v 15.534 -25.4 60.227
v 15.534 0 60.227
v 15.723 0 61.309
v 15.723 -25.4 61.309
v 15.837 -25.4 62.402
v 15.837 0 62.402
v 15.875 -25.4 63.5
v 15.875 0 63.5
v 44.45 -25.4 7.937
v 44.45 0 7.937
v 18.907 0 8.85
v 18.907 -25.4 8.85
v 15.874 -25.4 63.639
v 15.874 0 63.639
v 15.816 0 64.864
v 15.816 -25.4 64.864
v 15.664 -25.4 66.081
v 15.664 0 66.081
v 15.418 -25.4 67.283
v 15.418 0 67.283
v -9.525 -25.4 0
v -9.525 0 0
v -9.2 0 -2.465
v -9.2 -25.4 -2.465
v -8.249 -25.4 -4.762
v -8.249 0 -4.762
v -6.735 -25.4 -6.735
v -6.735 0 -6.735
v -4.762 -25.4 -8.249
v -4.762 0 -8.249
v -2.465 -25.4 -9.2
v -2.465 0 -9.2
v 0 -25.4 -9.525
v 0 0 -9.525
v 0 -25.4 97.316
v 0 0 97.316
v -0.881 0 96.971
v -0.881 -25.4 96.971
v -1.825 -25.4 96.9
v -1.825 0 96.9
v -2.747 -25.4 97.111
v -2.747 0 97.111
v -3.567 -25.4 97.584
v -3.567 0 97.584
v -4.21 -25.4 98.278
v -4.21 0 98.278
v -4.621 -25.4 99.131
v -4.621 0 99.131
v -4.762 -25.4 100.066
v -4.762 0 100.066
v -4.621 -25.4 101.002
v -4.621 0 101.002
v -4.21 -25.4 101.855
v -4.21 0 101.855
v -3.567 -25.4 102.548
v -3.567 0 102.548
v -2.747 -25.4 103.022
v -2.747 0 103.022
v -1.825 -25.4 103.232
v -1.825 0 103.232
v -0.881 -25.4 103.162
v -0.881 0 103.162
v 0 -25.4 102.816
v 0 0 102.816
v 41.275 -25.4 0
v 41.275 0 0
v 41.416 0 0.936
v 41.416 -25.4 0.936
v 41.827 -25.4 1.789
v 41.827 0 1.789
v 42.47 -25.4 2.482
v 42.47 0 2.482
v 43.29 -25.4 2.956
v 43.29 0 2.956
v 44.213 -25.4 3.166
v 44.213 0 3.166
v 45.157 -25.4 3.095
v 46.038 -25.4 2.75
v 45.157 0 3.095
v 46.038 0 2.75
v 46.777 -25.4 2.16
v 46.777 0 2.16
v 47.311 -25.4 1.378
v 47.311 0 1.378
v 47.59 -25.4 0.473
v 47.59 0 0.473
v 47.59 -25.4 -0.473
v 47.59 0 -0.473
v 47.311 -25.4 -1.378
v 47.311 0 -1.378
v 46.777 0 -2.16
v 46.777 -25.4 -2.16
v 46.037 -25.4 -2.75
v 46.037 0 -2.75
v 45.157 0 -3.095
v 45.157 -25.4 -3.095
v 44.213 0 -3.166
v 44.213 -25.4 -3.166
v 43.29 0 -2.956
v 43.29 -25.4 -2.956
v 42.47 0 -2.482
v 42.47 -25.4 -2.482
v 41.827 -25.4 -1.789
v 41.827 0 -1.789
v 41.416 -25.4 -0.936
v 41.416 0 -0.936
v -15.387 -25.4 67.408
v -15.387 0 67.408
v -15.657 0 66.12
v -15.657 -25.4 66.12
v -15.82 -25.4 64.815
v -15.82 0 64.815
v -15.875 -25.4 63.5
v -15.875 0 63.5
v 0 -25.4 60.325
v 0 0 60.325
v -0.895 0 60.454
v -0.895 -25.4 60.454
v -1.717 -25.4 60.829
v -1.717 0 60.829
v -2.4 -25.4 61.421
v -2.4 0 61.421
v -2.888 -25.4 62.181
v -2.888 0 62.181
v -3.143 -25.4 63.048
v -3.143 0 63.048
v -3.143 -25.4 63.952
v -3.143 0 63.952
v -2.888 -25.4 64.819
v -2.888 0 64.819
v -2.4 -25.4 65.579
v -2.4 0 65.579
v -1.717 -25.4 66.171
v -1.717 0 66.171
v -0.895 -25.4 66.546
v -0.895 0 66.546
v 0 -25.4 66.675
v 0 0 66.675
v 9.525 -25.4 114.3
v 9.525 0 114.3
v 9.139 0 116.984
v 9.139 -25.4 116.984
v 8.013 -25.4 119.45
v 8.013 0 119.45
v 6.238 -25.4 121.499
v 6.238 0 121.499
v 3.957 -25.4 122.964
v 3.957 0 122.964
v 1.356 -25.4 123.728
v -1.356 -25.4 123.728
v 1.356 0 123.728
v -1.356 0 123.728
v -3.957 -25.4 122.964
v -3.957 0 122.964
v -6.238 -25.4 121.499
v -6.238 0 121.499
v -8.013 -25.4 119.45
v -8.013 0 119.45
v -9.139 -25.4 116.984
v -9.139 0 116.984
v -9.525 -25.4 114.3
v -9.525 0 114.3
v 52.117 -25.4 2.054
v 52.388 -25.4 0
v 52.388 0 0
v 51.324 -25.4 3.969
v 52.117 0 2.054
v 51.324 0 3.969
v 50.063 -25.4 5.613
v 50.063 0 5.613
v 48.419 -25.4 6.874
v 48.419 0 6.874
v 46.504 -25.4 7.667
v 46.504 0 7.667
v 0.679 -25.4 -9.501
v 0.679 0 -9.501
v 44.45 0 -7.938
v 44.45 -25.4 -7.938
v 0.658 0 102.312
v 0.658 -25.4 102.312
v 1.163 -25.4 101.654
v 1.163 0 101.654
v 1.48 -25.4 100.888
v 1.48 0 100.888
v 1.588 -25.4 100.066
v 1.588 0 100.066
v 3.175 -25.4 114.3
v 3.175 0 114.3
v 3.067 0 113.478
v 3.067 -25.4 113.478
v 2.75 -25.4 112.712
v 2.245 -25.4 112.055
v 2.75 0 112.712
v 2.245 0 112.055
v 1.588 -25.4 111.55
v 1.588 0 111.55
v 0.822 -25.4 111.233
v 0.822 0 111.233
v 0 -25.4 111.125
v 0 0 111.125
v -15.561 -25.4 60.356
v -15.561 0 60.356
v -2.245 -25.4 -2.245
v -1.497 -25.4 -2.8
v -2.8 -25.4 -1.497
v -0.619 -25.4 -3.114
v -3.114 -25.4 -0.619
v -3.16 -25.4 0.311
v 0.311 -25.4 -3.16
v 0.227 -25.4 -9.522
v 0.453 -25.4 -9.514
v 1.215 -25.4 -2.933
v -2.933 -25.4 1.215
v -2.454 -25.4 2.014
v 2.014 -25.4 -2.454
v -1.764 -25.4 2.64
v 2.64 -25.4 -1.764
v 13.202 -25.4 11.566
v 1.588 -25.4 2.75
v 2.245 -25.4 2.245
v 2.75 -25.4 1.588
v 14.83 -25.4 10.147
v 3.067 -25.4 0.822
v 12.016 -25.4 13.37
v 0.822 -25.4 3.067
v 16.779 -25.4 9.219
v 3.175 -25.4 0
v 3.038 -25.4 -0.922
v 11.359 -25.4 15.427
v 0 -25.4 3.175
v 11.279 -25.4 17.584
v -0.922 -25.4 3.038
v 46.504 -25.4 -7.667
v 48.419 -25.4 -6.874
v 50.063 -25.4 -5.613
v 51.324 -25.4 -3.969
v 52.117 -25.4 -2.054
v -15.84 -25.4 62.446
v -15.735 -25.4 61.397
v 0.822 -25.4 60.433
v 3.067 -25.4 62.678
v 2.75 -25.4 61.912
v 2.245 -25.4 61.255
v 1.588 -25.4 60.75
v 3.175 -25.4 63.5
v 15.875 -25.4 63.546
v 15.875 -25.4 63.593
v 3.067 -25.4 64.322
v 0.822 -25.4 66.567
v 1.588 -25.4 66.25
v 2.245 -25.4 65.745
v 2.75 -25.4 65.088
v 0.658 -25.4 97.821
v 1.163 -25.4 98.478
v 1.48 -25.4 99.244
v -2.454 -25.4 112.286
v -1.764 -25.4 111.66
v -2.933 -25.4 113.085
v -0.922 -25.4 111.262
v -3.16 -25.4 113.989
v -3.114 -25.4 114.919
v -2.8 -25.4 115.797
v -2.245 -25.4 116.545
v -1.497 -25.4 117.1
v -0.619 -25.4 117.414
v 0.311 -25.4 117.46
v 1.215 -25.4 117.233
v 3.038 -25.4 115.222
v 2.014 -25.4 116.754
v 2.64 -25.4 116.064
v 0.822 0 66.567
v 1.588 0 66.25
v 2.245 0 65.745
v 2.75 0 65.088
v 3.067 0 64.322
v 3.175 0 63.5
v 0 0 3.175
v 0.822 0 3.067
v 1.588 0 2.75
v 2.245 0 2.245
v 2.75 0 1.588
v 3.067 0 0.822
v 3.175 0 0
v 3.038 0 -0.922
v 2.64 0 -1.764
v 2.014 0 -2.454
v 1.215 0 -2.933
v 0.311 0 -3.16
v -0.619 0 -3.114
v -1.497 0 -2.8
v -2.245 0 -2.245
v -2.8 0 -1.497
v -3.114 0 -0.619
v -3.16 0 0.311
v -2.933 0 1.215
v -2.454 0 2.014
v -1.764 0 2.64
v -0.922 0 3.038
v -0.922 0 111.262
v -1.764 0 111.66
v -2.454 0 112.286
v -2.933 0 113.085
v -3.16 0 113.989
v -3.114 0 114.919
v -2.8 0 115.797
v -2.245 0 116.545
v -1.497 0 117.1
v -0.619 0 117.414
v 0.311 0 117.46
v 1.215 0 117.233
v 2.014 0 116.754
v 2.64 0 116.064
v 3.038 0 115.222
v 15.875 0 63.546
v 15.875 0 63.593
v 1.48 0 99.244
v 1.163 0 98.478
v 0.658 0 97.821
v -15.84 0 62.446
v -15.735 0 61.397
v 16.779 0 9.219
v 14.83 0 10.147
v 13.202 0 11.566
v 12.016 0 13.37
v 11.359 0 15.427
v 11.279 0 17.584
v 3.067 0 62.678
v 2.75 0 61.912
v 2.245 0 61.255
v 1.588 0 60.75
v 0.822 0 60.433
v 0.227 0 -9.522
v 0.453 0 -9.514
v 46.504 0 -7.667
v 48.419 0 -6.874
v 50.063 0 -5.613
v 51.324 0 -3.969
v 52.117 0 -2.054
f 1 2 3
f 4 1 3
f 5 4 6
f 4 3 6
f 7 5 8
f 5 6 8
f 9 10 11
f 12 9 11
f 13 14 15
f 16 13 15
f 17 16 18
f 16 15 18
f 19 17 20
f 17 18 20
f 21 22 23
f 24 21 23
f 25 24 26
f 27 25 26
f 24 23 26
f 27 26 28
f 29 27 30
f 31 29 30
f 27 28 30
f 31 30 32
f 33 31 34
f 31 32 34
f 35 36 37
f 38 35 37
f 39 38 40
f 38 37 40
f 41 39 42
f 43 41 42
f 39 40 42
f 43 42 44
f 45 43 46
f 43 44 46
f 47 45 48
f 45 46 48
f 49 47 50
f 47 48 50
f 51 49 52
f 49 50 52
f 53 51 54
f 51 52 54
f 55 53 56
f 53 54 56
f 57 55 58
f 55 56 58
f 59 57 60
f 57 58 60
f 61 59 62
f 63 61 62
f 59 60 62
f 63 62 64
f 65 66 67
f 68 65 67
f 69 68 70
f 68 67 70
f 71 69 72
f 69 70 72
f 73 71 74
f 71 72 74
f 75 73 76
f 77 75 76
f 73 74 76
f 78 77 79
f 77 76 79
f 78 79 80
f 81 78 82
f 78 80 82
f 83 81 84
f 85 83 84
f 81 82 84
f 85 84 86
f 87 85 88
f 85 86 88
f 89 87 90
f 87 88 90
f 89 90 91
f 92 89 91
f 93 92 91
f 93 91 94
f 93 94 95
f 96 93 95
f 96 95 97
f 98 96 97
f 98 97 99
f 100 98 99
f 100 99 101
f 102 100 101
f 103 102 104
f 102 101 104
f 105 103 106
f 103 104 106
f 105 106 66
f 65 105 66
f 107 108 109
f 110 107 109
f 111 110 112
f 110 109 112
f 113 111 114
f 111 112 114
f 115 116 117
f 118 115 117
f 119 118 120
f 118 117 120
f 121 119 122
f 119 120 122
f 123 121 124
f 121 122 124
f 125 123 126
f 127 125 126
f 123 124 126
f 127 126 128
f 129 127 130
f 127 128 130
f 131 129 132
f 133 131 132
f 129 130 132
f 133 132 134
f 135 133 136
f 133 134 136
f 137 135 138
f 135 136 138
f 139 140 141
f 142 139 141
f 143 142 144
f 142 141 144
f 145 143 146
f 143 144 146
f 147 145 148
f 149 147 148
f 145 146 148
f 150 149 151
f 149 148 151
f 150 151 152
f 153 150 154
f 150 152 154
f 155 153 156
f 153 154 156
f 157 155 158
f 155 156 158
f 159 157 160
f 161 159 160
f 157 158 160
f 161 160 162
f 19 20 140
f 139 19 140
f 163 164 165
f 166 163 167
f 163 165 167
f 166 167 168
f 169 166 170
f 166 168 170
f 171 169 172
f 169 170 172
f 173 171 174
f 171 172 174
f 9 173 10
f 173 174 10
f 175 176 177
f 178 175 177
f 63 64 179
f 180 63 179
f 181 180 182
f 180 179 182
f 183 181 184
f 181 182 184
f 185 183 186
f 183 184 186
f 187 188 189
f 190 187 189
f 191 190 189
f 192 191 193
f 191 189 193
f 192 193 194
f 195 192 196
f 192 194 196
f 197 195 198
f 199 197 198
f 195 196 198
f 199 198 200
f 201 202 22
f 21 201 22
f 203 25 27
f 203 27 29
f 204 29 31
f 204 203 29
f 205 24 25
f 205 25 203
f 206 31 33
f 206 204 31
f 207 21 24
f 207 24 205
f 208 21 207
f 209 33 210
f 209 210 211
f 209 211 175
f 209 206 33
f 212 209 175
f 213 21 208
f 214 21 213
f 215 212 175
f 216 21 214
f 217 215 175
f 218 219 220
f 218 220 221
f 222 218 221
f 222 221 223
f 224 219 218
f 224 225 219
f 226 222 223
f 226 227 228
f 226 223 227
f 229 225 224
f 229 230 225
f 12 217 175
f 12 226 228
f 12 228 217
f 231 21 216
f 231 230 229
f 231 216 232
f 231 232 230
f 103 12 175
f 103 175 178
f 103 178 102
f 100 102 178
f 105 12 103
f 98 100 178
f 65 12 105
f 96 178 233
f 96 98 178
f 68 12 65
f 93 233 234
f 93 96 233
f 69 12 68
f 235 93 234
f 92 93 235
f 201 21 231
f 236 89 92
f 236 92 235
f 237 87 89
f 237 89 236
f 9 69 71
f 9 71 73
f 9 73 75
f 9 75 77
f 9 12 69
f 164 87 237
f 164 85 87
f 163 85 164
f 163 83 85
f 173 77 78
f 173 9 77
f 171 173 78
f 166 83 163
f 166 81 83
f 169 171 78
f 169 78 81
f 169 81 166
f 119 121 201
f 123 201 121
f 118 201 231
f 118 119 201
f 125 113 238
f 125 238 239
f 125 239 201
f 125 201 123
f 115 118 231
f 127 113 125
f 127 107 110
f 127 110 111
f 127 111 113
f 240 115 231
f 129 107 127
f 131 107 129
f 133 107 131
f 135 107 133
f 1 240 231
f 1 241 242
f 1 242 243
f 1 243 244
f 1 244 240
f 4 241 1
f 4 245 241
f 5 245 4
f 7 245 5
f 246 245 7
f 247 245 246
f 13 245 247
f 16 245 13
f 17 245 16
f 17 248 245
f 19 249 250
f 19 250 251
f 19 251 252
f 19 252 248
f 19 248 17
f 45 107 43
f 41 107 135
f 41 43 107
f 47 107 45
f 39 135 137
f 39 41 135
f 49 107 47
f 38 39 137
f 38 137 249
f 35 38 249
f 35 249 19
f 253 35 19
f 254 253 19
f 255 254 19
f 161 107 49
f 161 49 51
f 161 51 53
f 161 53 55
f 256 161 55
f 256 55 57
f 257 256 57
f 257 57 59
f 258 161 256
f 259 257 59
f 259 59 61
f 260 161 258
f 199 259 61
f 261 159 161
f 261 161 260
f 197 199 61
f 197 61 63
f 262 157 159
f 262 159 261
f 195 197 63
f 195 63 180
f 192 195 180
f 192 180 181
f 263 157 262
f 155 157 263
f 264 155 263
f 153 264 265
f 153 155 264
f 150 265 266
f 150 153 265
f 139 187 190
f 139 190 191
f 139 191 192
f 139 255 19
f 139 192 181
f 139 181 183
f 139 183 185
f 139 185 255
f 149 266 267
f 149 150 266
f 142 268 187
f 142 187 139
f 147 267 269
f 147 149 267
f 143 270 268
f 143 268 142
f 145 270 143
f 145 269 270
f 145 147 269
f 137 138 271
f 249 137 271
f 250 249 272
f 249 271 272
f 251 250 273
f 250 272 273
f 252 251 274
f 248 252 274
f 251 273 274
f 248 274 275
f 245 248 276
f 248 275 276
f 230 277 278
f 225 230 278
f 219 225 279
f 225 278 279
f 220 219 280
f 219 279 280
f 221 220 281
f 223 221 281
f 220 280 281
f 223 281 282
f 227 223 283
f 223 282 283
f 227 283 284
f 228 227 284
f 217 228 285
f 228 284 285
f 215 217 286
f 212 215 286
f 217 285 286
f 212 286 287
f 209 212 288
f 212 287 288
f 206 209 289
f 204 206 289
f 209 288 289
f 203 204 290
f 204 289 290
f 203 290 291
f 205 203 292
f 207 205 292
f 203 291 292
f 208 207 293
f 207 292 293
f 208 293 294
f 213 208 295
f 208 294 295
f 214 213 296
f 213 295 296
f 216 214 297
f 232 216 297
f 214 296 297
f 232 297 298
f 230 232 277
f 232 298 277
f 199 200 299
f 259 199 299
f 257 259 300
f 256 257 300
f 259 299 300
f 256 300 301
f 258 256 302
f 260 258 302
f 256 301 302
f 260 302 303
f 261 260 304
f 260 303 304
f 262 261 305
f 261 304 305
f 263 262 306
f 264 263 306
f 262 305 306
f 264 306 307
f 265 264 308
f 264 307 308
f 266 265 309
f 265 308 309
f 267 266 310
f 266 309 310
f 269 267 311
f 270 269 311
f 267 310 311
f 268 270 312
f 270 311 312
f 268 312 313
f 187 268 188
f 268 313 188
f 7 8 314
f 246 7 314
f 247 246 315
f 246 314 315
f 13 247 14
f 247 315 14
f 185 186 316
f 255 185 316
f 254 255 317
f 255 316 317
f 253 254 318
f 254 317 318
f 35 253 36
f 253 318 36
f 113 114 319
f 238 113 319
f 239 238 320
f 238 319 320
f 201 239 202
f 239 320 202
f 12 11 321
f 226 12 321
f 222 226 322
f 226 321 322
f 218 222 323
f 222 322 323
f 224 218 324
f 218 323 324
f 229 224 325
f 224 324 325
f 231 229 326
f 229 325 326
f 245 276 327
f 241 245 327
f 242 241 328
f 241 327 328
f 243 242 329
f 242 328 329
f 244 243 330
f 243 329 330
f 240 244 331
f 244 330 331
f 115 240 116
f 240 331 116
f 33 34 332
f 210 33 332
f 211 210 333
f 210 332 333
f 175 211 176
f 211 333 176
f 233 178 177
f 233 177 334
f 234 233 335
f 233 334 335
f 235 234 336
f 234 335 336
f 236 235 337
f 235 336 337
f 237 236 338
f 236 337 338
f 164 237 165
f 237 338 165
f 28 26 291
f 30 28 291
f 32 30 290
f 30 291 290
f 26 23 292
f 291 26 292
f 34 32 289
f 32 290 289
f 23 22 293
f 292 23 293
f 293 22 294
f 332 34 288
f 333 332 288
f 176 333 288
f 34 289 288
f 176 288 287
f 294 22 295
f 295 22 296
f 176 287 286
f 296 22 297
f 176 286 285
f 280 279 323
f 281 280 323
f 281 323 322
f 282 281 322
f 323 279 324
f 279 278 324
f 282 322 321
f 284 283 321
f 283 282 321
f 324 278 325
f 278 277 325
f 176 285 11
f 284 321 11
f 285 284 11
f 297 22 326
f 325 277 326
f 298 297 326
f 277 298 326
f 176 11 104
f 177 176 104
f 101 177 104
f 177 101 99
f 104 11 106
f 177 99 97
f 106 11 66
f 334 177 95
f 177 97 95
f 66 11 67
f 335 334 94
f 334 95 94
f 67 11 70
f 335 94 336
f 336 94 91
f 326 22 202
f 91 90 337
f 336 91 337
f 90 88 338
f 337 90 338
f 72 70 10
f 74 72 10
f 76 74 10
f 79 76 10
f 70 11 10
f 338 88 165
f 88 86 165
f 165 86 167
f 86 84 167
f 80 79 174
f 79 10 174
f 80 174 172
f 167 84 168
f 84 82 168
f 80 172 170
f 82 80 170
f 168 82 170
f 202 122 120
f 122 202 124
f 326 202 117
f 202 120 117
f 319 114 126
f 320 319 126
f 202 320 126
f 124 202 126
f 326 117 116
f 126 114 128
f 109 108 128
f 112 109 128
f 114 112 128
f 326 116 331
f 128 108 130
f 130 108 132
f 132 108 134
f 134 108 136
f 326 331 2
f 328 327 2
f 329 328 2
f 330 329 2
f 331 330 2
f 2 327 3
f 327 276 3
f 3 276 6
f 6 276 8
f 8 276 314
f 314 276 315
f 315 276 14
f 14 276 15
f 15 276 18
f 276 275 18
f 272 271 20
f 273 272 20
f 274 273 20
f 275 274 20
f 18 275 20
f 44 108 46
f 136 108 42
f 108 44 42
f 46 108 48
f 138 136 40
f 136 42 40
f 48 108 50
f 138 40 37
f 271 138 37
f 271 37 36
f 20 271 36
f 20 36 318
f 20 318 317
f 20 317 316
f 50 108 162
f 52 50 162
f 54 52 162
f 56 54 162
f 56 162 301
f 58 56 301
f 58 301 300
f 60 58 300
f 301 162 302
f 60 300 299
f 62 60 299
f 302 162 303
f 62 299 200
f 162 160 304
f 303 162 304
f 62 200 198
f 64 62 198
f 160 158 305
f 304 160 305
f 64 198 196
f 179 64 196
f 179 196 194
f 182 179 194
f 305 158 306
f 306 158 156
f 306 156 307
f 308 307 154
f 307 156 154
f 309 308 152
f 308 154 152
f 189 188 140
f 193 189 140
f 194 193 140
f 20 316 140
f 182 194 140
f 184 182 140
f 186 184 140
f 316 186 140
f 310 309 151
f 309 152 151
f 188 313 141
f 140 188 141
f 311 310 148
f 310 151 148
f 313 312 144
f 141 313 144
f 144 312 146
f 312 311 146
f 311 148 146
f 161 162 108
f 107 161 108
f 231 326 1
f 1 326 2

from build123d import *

# Parameters (mm, degrees)
F1_DEPTH = 25.4


with BuildPart() as f1:
    # F0 (on Front) → F1 (new body)
    with BuildSketch(Plane.XZ):
        with BuildLine():
            ThreePointArc((15.874389109, 63.6392674313), (15.7517676472, 65.4741937567), (15.4177611541, 67.2826268644))
            Line((15.4177611541, 67.2826268644), (15.874389109, 63.6392674313))
        make_face()
        with BuildLine():
            Line((-15.875, 63.5), (-15.3865384615, 67.4076923077))
            ThreePointArc((-15.3865384615, 67.4076923077), (-15.7524112928, 65.4690514116), (-15.875, 63.5))
        make_face()
        with BuildLine():
            Line((-15.5606435644, 60.3564356436), (-15.875, 63.5))
            ThreePointArc((-15.875, 63.5), (-15.7962153946, 61.9203784605), (-15.5606435644, 60.3564356436))
        make_face()
        with BuildLine():
            ThreePointArc((15.875, 63.5), (15.8748472765, 63.5696343856), (15.874389109, 63.6392674313))
            Line((15.874389109, 63.6392674313), (15.5339492009, 60.2270735993))
            ThreePointArc((15.5339492009, 60.2270735993), (15.7895070943, 61.8546761054), (15.875, 63.5))
        make_face()
        with BuildLine():
            Line((0.6794904459, -9.5007324841), (0, -9.525))
            ThreePointArc((0, -9.525), (0.3399618281, -9.5189311877), (0.6794904459, -9.5007324841))
        make_face()
        with BuildLine():
            ThreePointArc((0, 104.775), (6.7351920908, 107.5648079092), (9.525, 114.3))
            ThreePointArc((9.525, 114.3), (0, 123.825), (-9.525, 114.3))
            ThreePointArc((-9.525, 114.3), (-6.7351920908, 107.5648079092), (0, 104.775))
        make_face()
        with BuildLine():
            ThreePointArc((3.175, 114.3), (2.2450640303, 112.0549359697), (0, 111.125))
            ThreePointArc((0, 111.125), (-2.2450640303, 116.5450640303), (3.175, 114.3))
        make_face(mode=Mode.SUBTRACT)
        with BuildLine():
            ThreePointArc((0, 47.625), (-10.0526499203, 51.2134278751), (-15.5606435644, 60.3564356436))
            Line((-15.5606435644, 60.3564356436), (-9.525, 0))
            ThreePointArc((-9.525, 0), (-6.7351920908, 6.7351920908), (0, 9.525))
            Line((0, 9.525), (0, 47.625))
        make_face()
        with BuildLine():
            Line((36.5125, 0), (9.525, 0))
            ThreePointArc((9.525, 0), (6.9712901065, -6.4905114784), (0.6794904459, -9.5007324841))
            Line((0.6794904459, -9.5007324841), (44.45, -7.9375))
            ThreePointArc((44.45, -7.9375), (38.8373399243, -5.6126600757), (36.5125, 0))
        make_face()
        with BuildLine():
            ThreePointArc((52.3875, 0), (50.0626600757, 5.6126600757), (44.45, 7.9375))
            ThreePointArc((44.45, 7.9375), (38.8373399243, 5.6126600757), (36.5125, 0))
            ThreePointArc((36.5125, 0), (38.8373399243, -5.6126600757), (44.45, -7.9375))
            ThreePointArc((44.45, -7.9375), (50.0626600757, -5.6126600757), (52.3875, 0))
        make_face()
        with BuildLine():
            ThreePointArc((47.625, 0), (44.45, -3.175), (41.275, 0))
            ThreePointArc((41.275, 0), (44.45, 3.175), (47.625, 0))
        make_face(mode=Mode.SUBTRACT)
        with BuildLine():
            Line((15.4177611541, 67.2826268644), (9.525, 114.3))
            ThreePointArc((9.525, 114.3), (6.7351920908, 107.5648079092), (0, 104.775))
            Line((0, 104.775), (0, 102.8163525843))
            ThreePointArc((0, 102.8163525843), (1.1626238989, 101.6541683696), (1.5881934232, 100.0663216958))
            ThreePointArc((1.5881934232, 100.0663216958), (1.1626238989, 98.478475022), (0, 97.3162908073))
            Line((0, 97.3162908073), (0, 79.375))
            ThreePointArc((0, 79.375), (9.7971022126, 75.9912934973), (15.4177611541, 67.2826268644))
        make_face()
        with BuildLine():
            Line((11.2794016117, 17.5841850976), (15.5339492009, 60.2270735993))
            ThreePointArc((15.5339492009, 60.2270735993), (10.0014478549, 51.1717127789), (0, 47.625))
            Line((0, 47.625), (0, 9.525))
            ThreePointArc((0, 9.525), (6.7351920908, 6.7351920908), (9.525, 0))
            Line((9.525, 0), (36.5125, 0))
            ThreePointArc((36.5125, 0), (38.8373399243, 5.6126600757), (44.45, 7.9375))
            Line((44.45, 7.9375), (18.9065701995, 8.84976535))
            ThreePointArc((18.9065701995, 8.84976535), (13.2019437733, 11.565658071), (11.2794016117, 17.5841850976))
        make_face()
        with BuildLine():
            ThreePointArc((0, 9.525), (-6.7351920908, 6.7351920908), (-9.525, 0))
            ThreePointArc((-9.525, 0), (-6.7351920908, -6.7351920908), (0, -9.525))
            Line((0, -9.525), (0.6794904459, -9.5007324841))
            ThreePointArc((0.6794904459, -9.5007324841), (6.9712901065, -6.4905114784), (9.525, 0))
            Line((9.525, 0), (3.175, 0))
            ThreePointArc((3.175, 0), (-2.2450640303, -2.2450640303), (0, 3.175))
            Line((0, 3.175), (0, 9.525))
        make_face()
        with BuildLine():
            Line((15.874389109, 63.6392674313), (15.4177611541, 67.2826268644))
            ThreePointArc((15.4177611541, 67.2826268644), (9.7971022126, 75.9912934973), (0, 79.375))
            Line((0, 79.375), (0, 66.675))
            ThreePointArc((0, 66.675), (2.2450640303, 65.7450640303), (3.175, 63.5))
            ThreePointArc((3.175, 63.5), (2.2450640303, 61.2549359697), (0, 60.325))
            Line((0, 60.325), (0, 47.625))
            ThreePointArc((0, 47.625), (10.0014478549, 51.1717127789), (15.5339492009, 60.2270735993))
            Line((15.5339492009, 60.2270735993), (15.874389109, 63.6392674313))
        make_face()
        with BuildLine():
            ThreePointArc((0, 79.375), (-9.7463072395, 76.0309664508), (-15.3865384615, 67.4076923077))
            Line((-15.3865384615, 67.4076923077), (-15.875, 63.5))
            Line((-15.875, 63.5), (-15.5606435644, 60.3564356436))
            ThreePointArc((-15.5606435644, 60.3564356436), (-10.0526499203, 51.2134278751), (0, 47.625))
            Line((0, 47.625), (0, 60.325))
            ThreePointArc((0, 60.325), (-3.175, 63.5), (0, 66.675))
            Line((0, 66.675), (0, 79.375))
        make_face()
        with BuildLine():
            ThreePointArc((0, 104.775), (-6.7351920908, 107.5648079092), (-9.525, 114.3))
            Line((-9.525, 114.3), (-15.3865384615, 67.4076923077))
            ThreePointArc((-15.3865384615, 67.4076923077), (-9.7463072395, 76.0309664508), (0, 79.375))
            Line((0, 79.375), (0, 97.3162908073))
            ThreePointArc((0, 97.3162908073), (-4.7618065768, 100.0663216958), (0, 102.8163525843))
            Line((0, 102.8163525843), (0, 104.775))
        make_face()
        with BuildLine():
            ThreePointArc((9.525, 0), (6.7351920908, 6.7351920908), (0, 9.525))
            Line((0, 9.525), (0, 3.175))
            ThreePointArc((0, 3.175), (2.2450640303, 2.2450640303), (3.175, 0))
            Line((3.175, 0), (9.525, 0))
        make_face()
    extrude(amount=F1_DEPTH)


solid = f1.part
